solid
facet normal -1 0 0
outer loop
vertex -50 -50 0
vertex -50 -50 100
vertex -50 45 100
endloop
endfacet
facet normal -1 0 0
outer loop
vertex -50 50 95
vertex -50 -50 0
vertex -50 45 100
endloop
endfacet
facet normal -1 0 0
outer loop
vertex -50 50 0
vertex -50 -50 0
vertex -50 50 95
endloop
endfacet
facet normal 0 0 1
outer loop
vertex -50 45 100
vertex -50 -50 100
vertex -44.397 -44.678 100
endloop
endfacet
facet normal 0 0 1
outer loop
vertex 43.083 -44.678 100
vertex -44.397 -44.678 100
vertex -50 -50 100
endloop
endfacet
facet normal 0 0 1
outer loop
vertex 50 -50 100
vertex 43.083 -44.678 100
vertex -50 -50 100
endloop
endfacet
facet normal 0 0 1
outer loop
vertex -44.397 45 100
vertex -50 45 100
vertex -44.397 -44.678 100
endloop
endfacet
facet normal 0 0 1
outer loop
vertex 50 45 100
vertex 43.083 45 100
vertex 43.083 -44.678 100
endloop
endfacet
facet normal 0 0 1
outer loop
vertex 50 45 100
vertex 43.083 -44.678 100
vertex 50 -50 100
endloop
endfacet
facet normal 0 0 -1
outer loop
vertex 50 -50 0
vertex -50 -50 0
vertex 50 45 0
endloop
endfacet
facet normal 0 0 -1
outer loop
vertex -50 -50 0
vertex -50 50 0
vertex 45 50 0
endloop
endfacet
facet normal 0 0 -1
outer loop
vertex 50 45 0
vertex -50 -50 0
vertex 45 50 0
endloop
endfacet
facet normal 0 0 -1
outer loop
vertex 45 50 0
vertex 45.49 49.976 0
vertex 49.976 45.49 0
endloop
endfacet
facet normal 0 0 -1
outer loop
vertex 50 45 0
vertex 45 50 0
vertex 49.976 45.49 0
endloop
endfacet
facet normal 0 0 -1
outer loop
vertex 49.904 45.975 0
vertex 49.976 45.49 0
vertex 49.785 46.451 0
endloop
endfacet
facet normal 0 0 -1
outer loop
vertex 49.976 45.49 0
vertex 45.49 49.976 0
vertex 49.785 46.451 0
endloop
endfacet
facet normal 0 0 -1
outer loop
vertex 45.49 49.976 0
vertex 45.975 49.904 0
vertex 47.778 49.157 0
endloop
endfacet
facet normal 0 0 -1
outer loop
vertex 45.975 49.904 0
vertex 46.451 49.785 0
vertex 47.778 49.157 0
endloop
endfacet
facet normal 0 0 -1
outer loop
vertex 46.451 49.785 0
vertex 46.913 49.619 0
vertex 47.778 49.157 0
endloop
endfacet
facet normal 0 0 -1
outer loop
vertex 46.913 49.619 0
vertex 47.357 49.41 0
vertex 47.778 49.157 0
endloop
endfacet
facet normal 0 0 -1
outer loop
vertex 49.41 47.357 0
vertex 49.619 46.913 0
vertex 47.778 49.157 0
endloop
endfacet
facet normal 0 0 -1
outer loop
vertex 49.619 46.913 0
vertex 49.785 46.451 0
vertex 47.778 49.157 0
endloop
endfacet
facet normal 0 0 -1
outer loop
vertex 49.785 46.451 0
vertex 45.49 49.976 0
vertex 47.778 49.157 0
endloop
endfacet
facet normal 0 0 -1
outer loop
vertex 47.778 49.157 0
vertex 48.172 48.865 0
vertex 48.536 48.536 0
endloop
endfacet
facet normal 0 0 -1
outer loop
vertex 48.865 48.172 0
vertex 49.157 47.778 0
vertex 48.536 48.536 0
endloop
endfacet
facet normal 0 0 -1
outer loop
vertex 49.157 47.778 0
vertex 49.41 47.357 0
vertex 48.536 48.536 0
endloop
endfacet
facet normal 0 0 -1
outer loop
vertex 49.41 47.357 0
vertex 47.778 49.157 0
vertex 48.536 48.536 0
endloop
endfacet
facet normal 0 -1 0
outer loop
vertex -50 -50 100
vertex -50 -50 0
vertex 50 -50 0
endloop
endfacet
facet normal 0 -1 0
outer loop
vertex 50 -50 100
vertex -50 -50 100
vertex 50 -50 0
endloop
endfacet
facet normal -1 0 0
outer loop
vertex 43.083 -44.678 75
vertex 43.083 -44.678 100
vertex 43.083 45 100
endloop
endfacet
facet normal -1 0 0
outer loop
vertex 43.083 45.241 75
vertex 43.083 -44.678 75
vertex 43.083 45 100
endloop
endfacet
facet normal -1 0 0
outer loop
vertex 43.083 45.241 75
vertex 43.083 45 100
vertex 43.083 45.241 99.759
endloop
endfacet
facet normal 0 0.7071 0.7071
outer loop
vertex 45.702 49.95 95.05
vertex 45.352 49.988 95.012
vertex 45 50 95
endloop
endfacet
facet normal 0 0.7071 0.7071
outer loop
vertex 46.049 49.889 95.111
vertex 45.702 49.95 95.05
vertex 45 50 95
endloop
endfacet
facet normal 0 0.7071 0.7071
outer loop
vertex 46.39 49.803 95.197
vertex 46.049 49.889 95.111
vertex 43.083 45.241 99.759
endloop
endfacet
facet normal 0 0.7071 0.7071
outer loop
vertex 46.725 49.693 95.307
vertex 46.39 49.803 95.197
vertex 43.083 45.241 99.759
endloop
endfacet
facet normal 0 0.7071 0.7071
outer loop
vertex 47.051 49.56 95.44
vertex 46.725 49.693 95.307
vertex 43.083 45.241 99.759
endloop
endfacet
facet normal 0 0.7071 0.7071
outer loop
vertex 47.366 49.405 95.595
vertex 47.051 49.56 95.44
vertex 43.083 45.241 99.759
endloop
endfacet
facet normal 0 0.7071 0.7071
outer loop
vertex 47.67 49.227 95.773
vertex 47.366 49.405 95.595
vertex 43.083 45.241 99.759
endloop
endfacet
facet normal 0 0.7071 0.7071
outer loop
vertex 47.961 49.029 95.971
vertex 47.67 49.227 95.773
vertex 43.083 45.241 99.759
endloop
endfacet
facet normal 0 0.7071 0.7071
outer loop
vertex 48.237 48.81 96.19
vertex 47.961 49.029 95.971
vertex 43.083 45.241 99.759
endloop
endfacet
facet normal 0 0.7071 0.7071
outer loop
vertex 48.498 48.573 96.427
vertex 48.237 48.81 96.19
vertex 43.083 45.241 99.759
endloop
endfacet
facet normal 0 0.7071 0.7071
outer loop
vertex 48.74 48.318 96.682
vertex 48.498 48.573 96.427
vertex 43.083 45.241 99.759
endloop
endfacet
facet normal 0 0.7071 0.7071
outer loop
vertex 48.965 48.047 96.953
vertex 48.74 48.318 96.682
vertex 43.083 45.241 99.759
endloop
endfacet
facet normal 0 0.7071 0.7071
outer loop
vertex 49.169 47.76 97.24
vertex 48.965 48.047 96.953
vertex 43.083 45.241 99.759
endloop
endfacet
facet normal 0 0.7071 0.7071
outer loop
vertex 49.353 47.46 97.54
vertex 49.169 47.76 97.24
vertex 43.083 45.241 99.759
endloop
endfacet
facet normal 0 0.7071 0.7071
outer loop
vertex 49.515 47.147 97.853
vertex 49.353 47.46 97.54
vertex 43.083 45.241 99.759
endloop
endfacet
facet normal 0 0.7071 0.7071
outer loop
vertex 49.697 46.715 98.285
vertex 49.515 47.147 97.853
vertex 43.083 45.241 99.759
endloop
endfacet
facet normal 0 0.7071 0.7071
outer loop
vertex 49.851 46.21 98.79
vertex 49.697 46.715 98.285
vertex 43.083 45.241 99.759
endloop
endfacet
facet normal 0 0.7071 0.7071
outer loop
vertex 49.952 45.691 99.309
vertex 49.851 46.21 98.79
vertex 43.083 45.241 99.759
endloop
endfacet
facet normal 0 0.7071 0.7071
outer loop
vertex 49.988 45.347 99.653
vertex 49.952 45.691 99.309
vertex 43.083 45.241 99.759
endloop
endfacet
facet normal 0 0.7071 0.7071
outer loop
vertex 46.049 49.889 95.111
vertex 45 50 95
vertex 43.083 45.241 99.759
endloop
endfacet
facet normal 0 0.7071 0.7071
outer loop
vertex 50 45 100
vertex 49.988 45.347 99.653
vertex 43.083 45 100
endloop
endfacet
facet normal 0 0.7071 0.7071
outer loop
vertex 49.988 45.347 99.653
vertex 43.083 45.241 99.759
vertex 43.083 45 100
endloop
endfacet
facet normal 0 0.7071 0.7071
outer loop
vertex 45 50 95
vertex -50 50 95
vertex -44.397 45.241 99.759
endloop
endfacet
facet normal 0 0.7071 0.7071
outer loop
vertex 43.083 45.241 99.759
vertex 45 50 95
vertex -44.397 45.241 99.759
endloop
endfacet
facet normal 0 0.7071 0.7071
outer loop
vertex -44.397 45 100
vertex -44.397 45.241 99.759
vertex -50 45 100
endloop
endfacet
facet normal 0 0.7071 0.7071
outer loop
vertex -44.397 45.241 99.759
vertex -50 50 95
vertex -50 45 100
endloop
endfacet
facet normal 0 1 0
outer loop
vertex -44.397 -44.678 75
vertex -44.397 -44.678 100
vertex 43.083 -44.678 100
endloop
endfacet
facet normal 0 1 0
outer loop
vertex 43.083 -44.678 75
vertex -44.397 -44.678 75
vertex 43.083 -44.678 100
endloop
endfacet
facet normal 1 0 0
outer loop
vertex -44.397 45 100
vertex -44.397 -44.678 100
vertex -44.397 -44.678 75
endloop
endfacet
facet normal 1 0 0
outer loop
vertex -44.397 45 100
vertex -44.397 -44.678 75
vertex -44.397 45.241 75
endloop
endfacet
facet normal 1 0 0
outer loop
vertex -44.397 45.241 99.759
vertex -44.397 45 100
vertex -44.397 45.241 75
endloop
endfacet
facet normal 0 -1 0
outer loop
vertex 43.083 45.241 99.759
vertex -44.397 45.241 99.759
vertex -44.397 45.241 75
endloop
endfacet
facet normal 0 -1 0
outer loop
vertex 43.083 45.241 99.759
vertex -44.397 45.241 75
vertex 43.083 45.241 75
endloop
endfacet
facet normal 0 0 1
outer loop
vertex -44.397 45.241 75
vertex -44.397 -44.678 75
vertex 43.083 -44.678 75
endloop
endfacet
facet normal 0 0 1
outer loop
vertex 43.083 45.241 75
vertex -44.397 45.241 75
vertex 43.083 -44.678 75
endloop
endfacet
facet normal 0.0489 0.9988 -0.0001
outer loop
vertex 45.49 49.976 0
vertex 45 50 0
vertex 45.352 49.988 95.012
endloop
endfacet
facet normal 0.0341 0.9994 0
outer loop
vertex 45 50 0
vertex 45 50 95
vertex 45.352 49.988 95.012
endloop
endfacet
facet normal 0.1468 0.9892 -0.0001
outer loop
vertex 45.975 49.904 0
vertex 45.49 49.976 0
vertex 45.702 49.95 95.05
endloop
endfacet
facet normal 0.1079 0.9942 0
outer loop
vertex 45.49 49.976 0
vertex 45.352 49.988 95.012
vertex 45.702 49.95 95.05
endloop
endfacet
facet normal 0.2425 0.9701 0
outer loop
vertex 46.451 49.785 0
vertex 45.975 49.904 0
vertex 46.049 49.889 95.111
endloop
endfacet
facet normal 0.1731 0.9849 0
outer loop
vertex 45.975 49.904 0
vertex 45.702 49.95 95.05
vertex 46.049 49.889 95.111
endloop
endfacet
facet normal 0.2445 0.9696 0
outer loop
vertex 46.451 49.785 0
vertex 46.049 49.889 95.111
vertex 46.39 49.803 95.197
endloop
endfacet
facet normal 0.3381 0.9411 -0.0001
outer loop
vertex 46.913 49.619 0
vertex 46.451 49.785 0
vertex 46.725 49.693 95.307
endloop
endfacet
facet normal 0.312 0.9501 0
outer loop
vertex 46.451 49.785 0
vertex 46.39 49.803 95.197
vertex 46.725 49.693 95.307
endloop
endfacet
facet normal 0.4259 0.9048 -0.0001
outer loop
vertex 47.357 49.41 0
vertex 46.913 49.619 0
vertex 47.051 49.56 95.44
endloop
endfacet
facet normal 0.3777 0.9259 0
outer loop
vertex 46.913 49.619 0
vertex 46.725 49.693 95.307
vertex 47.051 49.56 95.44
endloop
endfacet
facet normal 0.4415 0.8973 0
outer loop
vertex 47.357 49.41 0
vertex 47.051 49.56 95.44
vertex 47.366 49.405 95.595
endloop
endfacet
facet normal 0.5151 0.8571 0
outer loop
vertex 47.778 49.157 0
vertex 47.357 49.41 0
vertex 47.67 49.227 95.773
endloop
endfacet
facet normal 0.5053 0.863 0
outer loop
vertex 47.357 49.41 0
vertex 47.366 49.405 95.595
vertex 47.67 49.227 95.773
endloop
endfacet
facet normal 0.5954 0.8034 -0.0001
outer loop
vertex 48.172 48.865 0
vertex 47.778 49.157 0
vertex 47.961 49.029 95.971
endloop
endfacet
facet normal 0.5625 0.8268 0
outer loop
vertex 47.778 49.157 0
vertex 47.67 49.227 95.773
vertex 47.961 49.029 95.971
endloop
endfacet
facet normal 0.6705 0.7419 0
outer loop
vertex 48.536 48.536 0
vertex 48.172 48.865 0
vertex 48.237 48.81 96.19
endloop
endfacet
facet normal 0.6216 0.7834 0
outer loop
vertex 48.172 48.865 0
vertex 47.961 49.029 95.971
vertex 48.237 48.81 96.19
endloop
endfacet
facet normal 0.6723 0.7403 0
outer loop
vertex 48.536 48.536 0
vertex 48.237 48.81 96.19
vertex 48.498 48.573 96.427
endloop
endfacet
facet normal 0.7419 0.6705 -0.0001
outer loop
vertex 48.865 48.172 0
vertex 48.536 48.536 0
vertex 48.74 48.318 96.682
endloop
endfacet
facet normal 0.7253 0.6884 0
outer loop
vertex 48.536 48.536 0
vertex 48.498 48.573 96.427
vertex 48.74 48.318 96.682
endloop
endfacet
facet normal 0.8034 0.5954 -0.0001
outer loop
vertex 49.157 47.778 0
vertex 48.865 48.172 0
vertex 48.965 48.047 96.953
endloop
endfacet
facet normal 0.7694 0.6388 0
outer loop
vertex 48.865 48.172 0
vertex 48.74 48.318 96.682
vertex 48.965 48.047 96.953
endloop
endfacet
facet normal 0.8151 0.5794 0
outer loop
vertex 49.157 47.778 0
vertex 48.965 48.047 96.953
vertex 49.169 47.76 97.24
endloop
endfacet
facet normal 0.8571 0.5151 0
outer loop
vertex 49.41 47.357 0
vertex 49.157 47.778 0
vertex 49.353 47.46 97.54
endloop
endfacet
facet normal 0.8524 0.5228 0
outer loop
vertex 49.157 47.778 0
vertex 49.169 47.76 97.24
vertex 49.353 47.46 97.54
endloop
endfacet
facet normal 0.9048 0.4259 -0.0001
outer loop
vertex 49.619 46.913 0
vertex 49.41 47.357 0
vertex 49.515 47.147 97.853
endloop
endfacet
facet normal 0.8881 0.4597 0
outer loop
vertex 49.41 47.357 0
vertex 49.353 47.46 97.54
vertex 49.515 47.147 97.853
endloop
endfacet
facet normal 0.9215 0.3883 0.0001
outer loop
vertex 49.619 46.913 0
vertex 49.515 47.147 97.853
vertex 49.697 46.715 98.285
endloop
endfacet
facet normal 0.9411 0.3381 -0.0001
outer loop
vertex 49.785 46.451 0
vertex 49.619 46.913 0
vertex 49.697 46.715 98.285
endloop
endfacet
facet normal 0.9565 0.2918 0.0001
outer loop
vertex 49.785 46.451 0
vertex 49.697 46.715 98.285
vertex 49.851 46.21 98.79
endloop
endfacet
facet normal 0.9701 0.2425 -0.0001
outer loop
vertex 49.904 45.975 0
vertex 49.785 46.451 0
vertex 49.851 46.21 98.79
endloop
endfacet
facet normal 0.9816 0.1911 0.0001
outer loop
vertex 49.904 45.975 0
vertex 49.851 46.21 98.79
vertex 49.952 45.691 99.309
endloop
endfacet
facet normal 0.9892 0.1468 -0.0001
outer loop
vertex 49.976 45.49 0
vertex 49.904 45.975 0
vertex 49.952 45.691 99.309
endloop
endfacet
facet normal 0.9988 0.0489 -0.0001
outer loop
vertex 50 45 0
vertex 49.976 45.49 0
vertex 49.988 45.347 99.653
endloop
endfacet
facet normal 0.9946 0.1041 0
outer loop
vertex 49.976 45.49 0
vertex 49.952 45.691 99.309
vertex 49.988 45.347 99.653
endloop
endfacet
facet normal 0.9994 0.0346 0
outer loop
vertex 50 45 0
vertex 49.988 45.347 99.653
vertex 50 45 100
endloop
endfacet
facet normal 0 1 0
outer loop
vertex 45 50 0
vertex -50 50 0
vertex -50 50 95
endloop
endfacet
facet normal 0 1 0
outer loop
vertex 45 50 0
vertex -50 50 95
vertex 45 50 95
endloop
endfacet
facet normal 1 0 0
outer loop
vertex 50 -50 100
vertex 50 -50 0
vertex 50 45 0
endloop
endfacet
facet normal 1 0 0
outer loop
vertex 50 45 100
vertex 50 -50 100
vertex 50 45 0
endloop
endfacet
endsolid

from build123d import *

# Parameters (mm, degrees)
F0_W        = 100
F0_H        = 100
F1_DEPTH    = 100
F2_W        = 87.4791443348
F2_H        = 89.9195559323
F3_DEPTH    = 25
F4_T1_DEPTH = 125.7168298797
F5_R        = 5


# Not quite as in the source:
# - a fillet or chamfer that OpenCascade refuses, or shapes differently, is made with other operations: its cross-section is extruded or revolved along the edge and cut away or added


with BuildPart() as f1:
    # F0 (on Top) → F1 (new body)
    with BuildSketch(Plane.XY):
        Rectangle(F0_W, F0_H)
    extrude(amount=F1_DEPTH)

    # F2 (on face) → F3 (cut)
    with BuildSketch(Plane.XY.offset(100)):
        with Locations((-0.6570331752, 0.2815853804)):
            Rectangle(F2_W, F2_H)
    extrude(amount=-F3_DEPTH, mode=Mode.SUBTRACT)

    # F4: chamfer of 5 on 1 edges, made by hand

    # F4_s2 → F4_t1 (cut)
    with BuildSketch(Plane.YZ.offset(-62.8584149398)):
        Polygon((50, 95), (45, 100), (50, 100), align=None)
    extrude(amount=F4_T1_DEPTH, mode=Mode.SUBTRACT)

    # F5
    f5_edges = [f1.edges().sort_by_distance(p)[0] for p in [
        (50, 50, 47.5),
    ]]
    fillet(f5_edges, radius=F5_R)


solid = f1.part
